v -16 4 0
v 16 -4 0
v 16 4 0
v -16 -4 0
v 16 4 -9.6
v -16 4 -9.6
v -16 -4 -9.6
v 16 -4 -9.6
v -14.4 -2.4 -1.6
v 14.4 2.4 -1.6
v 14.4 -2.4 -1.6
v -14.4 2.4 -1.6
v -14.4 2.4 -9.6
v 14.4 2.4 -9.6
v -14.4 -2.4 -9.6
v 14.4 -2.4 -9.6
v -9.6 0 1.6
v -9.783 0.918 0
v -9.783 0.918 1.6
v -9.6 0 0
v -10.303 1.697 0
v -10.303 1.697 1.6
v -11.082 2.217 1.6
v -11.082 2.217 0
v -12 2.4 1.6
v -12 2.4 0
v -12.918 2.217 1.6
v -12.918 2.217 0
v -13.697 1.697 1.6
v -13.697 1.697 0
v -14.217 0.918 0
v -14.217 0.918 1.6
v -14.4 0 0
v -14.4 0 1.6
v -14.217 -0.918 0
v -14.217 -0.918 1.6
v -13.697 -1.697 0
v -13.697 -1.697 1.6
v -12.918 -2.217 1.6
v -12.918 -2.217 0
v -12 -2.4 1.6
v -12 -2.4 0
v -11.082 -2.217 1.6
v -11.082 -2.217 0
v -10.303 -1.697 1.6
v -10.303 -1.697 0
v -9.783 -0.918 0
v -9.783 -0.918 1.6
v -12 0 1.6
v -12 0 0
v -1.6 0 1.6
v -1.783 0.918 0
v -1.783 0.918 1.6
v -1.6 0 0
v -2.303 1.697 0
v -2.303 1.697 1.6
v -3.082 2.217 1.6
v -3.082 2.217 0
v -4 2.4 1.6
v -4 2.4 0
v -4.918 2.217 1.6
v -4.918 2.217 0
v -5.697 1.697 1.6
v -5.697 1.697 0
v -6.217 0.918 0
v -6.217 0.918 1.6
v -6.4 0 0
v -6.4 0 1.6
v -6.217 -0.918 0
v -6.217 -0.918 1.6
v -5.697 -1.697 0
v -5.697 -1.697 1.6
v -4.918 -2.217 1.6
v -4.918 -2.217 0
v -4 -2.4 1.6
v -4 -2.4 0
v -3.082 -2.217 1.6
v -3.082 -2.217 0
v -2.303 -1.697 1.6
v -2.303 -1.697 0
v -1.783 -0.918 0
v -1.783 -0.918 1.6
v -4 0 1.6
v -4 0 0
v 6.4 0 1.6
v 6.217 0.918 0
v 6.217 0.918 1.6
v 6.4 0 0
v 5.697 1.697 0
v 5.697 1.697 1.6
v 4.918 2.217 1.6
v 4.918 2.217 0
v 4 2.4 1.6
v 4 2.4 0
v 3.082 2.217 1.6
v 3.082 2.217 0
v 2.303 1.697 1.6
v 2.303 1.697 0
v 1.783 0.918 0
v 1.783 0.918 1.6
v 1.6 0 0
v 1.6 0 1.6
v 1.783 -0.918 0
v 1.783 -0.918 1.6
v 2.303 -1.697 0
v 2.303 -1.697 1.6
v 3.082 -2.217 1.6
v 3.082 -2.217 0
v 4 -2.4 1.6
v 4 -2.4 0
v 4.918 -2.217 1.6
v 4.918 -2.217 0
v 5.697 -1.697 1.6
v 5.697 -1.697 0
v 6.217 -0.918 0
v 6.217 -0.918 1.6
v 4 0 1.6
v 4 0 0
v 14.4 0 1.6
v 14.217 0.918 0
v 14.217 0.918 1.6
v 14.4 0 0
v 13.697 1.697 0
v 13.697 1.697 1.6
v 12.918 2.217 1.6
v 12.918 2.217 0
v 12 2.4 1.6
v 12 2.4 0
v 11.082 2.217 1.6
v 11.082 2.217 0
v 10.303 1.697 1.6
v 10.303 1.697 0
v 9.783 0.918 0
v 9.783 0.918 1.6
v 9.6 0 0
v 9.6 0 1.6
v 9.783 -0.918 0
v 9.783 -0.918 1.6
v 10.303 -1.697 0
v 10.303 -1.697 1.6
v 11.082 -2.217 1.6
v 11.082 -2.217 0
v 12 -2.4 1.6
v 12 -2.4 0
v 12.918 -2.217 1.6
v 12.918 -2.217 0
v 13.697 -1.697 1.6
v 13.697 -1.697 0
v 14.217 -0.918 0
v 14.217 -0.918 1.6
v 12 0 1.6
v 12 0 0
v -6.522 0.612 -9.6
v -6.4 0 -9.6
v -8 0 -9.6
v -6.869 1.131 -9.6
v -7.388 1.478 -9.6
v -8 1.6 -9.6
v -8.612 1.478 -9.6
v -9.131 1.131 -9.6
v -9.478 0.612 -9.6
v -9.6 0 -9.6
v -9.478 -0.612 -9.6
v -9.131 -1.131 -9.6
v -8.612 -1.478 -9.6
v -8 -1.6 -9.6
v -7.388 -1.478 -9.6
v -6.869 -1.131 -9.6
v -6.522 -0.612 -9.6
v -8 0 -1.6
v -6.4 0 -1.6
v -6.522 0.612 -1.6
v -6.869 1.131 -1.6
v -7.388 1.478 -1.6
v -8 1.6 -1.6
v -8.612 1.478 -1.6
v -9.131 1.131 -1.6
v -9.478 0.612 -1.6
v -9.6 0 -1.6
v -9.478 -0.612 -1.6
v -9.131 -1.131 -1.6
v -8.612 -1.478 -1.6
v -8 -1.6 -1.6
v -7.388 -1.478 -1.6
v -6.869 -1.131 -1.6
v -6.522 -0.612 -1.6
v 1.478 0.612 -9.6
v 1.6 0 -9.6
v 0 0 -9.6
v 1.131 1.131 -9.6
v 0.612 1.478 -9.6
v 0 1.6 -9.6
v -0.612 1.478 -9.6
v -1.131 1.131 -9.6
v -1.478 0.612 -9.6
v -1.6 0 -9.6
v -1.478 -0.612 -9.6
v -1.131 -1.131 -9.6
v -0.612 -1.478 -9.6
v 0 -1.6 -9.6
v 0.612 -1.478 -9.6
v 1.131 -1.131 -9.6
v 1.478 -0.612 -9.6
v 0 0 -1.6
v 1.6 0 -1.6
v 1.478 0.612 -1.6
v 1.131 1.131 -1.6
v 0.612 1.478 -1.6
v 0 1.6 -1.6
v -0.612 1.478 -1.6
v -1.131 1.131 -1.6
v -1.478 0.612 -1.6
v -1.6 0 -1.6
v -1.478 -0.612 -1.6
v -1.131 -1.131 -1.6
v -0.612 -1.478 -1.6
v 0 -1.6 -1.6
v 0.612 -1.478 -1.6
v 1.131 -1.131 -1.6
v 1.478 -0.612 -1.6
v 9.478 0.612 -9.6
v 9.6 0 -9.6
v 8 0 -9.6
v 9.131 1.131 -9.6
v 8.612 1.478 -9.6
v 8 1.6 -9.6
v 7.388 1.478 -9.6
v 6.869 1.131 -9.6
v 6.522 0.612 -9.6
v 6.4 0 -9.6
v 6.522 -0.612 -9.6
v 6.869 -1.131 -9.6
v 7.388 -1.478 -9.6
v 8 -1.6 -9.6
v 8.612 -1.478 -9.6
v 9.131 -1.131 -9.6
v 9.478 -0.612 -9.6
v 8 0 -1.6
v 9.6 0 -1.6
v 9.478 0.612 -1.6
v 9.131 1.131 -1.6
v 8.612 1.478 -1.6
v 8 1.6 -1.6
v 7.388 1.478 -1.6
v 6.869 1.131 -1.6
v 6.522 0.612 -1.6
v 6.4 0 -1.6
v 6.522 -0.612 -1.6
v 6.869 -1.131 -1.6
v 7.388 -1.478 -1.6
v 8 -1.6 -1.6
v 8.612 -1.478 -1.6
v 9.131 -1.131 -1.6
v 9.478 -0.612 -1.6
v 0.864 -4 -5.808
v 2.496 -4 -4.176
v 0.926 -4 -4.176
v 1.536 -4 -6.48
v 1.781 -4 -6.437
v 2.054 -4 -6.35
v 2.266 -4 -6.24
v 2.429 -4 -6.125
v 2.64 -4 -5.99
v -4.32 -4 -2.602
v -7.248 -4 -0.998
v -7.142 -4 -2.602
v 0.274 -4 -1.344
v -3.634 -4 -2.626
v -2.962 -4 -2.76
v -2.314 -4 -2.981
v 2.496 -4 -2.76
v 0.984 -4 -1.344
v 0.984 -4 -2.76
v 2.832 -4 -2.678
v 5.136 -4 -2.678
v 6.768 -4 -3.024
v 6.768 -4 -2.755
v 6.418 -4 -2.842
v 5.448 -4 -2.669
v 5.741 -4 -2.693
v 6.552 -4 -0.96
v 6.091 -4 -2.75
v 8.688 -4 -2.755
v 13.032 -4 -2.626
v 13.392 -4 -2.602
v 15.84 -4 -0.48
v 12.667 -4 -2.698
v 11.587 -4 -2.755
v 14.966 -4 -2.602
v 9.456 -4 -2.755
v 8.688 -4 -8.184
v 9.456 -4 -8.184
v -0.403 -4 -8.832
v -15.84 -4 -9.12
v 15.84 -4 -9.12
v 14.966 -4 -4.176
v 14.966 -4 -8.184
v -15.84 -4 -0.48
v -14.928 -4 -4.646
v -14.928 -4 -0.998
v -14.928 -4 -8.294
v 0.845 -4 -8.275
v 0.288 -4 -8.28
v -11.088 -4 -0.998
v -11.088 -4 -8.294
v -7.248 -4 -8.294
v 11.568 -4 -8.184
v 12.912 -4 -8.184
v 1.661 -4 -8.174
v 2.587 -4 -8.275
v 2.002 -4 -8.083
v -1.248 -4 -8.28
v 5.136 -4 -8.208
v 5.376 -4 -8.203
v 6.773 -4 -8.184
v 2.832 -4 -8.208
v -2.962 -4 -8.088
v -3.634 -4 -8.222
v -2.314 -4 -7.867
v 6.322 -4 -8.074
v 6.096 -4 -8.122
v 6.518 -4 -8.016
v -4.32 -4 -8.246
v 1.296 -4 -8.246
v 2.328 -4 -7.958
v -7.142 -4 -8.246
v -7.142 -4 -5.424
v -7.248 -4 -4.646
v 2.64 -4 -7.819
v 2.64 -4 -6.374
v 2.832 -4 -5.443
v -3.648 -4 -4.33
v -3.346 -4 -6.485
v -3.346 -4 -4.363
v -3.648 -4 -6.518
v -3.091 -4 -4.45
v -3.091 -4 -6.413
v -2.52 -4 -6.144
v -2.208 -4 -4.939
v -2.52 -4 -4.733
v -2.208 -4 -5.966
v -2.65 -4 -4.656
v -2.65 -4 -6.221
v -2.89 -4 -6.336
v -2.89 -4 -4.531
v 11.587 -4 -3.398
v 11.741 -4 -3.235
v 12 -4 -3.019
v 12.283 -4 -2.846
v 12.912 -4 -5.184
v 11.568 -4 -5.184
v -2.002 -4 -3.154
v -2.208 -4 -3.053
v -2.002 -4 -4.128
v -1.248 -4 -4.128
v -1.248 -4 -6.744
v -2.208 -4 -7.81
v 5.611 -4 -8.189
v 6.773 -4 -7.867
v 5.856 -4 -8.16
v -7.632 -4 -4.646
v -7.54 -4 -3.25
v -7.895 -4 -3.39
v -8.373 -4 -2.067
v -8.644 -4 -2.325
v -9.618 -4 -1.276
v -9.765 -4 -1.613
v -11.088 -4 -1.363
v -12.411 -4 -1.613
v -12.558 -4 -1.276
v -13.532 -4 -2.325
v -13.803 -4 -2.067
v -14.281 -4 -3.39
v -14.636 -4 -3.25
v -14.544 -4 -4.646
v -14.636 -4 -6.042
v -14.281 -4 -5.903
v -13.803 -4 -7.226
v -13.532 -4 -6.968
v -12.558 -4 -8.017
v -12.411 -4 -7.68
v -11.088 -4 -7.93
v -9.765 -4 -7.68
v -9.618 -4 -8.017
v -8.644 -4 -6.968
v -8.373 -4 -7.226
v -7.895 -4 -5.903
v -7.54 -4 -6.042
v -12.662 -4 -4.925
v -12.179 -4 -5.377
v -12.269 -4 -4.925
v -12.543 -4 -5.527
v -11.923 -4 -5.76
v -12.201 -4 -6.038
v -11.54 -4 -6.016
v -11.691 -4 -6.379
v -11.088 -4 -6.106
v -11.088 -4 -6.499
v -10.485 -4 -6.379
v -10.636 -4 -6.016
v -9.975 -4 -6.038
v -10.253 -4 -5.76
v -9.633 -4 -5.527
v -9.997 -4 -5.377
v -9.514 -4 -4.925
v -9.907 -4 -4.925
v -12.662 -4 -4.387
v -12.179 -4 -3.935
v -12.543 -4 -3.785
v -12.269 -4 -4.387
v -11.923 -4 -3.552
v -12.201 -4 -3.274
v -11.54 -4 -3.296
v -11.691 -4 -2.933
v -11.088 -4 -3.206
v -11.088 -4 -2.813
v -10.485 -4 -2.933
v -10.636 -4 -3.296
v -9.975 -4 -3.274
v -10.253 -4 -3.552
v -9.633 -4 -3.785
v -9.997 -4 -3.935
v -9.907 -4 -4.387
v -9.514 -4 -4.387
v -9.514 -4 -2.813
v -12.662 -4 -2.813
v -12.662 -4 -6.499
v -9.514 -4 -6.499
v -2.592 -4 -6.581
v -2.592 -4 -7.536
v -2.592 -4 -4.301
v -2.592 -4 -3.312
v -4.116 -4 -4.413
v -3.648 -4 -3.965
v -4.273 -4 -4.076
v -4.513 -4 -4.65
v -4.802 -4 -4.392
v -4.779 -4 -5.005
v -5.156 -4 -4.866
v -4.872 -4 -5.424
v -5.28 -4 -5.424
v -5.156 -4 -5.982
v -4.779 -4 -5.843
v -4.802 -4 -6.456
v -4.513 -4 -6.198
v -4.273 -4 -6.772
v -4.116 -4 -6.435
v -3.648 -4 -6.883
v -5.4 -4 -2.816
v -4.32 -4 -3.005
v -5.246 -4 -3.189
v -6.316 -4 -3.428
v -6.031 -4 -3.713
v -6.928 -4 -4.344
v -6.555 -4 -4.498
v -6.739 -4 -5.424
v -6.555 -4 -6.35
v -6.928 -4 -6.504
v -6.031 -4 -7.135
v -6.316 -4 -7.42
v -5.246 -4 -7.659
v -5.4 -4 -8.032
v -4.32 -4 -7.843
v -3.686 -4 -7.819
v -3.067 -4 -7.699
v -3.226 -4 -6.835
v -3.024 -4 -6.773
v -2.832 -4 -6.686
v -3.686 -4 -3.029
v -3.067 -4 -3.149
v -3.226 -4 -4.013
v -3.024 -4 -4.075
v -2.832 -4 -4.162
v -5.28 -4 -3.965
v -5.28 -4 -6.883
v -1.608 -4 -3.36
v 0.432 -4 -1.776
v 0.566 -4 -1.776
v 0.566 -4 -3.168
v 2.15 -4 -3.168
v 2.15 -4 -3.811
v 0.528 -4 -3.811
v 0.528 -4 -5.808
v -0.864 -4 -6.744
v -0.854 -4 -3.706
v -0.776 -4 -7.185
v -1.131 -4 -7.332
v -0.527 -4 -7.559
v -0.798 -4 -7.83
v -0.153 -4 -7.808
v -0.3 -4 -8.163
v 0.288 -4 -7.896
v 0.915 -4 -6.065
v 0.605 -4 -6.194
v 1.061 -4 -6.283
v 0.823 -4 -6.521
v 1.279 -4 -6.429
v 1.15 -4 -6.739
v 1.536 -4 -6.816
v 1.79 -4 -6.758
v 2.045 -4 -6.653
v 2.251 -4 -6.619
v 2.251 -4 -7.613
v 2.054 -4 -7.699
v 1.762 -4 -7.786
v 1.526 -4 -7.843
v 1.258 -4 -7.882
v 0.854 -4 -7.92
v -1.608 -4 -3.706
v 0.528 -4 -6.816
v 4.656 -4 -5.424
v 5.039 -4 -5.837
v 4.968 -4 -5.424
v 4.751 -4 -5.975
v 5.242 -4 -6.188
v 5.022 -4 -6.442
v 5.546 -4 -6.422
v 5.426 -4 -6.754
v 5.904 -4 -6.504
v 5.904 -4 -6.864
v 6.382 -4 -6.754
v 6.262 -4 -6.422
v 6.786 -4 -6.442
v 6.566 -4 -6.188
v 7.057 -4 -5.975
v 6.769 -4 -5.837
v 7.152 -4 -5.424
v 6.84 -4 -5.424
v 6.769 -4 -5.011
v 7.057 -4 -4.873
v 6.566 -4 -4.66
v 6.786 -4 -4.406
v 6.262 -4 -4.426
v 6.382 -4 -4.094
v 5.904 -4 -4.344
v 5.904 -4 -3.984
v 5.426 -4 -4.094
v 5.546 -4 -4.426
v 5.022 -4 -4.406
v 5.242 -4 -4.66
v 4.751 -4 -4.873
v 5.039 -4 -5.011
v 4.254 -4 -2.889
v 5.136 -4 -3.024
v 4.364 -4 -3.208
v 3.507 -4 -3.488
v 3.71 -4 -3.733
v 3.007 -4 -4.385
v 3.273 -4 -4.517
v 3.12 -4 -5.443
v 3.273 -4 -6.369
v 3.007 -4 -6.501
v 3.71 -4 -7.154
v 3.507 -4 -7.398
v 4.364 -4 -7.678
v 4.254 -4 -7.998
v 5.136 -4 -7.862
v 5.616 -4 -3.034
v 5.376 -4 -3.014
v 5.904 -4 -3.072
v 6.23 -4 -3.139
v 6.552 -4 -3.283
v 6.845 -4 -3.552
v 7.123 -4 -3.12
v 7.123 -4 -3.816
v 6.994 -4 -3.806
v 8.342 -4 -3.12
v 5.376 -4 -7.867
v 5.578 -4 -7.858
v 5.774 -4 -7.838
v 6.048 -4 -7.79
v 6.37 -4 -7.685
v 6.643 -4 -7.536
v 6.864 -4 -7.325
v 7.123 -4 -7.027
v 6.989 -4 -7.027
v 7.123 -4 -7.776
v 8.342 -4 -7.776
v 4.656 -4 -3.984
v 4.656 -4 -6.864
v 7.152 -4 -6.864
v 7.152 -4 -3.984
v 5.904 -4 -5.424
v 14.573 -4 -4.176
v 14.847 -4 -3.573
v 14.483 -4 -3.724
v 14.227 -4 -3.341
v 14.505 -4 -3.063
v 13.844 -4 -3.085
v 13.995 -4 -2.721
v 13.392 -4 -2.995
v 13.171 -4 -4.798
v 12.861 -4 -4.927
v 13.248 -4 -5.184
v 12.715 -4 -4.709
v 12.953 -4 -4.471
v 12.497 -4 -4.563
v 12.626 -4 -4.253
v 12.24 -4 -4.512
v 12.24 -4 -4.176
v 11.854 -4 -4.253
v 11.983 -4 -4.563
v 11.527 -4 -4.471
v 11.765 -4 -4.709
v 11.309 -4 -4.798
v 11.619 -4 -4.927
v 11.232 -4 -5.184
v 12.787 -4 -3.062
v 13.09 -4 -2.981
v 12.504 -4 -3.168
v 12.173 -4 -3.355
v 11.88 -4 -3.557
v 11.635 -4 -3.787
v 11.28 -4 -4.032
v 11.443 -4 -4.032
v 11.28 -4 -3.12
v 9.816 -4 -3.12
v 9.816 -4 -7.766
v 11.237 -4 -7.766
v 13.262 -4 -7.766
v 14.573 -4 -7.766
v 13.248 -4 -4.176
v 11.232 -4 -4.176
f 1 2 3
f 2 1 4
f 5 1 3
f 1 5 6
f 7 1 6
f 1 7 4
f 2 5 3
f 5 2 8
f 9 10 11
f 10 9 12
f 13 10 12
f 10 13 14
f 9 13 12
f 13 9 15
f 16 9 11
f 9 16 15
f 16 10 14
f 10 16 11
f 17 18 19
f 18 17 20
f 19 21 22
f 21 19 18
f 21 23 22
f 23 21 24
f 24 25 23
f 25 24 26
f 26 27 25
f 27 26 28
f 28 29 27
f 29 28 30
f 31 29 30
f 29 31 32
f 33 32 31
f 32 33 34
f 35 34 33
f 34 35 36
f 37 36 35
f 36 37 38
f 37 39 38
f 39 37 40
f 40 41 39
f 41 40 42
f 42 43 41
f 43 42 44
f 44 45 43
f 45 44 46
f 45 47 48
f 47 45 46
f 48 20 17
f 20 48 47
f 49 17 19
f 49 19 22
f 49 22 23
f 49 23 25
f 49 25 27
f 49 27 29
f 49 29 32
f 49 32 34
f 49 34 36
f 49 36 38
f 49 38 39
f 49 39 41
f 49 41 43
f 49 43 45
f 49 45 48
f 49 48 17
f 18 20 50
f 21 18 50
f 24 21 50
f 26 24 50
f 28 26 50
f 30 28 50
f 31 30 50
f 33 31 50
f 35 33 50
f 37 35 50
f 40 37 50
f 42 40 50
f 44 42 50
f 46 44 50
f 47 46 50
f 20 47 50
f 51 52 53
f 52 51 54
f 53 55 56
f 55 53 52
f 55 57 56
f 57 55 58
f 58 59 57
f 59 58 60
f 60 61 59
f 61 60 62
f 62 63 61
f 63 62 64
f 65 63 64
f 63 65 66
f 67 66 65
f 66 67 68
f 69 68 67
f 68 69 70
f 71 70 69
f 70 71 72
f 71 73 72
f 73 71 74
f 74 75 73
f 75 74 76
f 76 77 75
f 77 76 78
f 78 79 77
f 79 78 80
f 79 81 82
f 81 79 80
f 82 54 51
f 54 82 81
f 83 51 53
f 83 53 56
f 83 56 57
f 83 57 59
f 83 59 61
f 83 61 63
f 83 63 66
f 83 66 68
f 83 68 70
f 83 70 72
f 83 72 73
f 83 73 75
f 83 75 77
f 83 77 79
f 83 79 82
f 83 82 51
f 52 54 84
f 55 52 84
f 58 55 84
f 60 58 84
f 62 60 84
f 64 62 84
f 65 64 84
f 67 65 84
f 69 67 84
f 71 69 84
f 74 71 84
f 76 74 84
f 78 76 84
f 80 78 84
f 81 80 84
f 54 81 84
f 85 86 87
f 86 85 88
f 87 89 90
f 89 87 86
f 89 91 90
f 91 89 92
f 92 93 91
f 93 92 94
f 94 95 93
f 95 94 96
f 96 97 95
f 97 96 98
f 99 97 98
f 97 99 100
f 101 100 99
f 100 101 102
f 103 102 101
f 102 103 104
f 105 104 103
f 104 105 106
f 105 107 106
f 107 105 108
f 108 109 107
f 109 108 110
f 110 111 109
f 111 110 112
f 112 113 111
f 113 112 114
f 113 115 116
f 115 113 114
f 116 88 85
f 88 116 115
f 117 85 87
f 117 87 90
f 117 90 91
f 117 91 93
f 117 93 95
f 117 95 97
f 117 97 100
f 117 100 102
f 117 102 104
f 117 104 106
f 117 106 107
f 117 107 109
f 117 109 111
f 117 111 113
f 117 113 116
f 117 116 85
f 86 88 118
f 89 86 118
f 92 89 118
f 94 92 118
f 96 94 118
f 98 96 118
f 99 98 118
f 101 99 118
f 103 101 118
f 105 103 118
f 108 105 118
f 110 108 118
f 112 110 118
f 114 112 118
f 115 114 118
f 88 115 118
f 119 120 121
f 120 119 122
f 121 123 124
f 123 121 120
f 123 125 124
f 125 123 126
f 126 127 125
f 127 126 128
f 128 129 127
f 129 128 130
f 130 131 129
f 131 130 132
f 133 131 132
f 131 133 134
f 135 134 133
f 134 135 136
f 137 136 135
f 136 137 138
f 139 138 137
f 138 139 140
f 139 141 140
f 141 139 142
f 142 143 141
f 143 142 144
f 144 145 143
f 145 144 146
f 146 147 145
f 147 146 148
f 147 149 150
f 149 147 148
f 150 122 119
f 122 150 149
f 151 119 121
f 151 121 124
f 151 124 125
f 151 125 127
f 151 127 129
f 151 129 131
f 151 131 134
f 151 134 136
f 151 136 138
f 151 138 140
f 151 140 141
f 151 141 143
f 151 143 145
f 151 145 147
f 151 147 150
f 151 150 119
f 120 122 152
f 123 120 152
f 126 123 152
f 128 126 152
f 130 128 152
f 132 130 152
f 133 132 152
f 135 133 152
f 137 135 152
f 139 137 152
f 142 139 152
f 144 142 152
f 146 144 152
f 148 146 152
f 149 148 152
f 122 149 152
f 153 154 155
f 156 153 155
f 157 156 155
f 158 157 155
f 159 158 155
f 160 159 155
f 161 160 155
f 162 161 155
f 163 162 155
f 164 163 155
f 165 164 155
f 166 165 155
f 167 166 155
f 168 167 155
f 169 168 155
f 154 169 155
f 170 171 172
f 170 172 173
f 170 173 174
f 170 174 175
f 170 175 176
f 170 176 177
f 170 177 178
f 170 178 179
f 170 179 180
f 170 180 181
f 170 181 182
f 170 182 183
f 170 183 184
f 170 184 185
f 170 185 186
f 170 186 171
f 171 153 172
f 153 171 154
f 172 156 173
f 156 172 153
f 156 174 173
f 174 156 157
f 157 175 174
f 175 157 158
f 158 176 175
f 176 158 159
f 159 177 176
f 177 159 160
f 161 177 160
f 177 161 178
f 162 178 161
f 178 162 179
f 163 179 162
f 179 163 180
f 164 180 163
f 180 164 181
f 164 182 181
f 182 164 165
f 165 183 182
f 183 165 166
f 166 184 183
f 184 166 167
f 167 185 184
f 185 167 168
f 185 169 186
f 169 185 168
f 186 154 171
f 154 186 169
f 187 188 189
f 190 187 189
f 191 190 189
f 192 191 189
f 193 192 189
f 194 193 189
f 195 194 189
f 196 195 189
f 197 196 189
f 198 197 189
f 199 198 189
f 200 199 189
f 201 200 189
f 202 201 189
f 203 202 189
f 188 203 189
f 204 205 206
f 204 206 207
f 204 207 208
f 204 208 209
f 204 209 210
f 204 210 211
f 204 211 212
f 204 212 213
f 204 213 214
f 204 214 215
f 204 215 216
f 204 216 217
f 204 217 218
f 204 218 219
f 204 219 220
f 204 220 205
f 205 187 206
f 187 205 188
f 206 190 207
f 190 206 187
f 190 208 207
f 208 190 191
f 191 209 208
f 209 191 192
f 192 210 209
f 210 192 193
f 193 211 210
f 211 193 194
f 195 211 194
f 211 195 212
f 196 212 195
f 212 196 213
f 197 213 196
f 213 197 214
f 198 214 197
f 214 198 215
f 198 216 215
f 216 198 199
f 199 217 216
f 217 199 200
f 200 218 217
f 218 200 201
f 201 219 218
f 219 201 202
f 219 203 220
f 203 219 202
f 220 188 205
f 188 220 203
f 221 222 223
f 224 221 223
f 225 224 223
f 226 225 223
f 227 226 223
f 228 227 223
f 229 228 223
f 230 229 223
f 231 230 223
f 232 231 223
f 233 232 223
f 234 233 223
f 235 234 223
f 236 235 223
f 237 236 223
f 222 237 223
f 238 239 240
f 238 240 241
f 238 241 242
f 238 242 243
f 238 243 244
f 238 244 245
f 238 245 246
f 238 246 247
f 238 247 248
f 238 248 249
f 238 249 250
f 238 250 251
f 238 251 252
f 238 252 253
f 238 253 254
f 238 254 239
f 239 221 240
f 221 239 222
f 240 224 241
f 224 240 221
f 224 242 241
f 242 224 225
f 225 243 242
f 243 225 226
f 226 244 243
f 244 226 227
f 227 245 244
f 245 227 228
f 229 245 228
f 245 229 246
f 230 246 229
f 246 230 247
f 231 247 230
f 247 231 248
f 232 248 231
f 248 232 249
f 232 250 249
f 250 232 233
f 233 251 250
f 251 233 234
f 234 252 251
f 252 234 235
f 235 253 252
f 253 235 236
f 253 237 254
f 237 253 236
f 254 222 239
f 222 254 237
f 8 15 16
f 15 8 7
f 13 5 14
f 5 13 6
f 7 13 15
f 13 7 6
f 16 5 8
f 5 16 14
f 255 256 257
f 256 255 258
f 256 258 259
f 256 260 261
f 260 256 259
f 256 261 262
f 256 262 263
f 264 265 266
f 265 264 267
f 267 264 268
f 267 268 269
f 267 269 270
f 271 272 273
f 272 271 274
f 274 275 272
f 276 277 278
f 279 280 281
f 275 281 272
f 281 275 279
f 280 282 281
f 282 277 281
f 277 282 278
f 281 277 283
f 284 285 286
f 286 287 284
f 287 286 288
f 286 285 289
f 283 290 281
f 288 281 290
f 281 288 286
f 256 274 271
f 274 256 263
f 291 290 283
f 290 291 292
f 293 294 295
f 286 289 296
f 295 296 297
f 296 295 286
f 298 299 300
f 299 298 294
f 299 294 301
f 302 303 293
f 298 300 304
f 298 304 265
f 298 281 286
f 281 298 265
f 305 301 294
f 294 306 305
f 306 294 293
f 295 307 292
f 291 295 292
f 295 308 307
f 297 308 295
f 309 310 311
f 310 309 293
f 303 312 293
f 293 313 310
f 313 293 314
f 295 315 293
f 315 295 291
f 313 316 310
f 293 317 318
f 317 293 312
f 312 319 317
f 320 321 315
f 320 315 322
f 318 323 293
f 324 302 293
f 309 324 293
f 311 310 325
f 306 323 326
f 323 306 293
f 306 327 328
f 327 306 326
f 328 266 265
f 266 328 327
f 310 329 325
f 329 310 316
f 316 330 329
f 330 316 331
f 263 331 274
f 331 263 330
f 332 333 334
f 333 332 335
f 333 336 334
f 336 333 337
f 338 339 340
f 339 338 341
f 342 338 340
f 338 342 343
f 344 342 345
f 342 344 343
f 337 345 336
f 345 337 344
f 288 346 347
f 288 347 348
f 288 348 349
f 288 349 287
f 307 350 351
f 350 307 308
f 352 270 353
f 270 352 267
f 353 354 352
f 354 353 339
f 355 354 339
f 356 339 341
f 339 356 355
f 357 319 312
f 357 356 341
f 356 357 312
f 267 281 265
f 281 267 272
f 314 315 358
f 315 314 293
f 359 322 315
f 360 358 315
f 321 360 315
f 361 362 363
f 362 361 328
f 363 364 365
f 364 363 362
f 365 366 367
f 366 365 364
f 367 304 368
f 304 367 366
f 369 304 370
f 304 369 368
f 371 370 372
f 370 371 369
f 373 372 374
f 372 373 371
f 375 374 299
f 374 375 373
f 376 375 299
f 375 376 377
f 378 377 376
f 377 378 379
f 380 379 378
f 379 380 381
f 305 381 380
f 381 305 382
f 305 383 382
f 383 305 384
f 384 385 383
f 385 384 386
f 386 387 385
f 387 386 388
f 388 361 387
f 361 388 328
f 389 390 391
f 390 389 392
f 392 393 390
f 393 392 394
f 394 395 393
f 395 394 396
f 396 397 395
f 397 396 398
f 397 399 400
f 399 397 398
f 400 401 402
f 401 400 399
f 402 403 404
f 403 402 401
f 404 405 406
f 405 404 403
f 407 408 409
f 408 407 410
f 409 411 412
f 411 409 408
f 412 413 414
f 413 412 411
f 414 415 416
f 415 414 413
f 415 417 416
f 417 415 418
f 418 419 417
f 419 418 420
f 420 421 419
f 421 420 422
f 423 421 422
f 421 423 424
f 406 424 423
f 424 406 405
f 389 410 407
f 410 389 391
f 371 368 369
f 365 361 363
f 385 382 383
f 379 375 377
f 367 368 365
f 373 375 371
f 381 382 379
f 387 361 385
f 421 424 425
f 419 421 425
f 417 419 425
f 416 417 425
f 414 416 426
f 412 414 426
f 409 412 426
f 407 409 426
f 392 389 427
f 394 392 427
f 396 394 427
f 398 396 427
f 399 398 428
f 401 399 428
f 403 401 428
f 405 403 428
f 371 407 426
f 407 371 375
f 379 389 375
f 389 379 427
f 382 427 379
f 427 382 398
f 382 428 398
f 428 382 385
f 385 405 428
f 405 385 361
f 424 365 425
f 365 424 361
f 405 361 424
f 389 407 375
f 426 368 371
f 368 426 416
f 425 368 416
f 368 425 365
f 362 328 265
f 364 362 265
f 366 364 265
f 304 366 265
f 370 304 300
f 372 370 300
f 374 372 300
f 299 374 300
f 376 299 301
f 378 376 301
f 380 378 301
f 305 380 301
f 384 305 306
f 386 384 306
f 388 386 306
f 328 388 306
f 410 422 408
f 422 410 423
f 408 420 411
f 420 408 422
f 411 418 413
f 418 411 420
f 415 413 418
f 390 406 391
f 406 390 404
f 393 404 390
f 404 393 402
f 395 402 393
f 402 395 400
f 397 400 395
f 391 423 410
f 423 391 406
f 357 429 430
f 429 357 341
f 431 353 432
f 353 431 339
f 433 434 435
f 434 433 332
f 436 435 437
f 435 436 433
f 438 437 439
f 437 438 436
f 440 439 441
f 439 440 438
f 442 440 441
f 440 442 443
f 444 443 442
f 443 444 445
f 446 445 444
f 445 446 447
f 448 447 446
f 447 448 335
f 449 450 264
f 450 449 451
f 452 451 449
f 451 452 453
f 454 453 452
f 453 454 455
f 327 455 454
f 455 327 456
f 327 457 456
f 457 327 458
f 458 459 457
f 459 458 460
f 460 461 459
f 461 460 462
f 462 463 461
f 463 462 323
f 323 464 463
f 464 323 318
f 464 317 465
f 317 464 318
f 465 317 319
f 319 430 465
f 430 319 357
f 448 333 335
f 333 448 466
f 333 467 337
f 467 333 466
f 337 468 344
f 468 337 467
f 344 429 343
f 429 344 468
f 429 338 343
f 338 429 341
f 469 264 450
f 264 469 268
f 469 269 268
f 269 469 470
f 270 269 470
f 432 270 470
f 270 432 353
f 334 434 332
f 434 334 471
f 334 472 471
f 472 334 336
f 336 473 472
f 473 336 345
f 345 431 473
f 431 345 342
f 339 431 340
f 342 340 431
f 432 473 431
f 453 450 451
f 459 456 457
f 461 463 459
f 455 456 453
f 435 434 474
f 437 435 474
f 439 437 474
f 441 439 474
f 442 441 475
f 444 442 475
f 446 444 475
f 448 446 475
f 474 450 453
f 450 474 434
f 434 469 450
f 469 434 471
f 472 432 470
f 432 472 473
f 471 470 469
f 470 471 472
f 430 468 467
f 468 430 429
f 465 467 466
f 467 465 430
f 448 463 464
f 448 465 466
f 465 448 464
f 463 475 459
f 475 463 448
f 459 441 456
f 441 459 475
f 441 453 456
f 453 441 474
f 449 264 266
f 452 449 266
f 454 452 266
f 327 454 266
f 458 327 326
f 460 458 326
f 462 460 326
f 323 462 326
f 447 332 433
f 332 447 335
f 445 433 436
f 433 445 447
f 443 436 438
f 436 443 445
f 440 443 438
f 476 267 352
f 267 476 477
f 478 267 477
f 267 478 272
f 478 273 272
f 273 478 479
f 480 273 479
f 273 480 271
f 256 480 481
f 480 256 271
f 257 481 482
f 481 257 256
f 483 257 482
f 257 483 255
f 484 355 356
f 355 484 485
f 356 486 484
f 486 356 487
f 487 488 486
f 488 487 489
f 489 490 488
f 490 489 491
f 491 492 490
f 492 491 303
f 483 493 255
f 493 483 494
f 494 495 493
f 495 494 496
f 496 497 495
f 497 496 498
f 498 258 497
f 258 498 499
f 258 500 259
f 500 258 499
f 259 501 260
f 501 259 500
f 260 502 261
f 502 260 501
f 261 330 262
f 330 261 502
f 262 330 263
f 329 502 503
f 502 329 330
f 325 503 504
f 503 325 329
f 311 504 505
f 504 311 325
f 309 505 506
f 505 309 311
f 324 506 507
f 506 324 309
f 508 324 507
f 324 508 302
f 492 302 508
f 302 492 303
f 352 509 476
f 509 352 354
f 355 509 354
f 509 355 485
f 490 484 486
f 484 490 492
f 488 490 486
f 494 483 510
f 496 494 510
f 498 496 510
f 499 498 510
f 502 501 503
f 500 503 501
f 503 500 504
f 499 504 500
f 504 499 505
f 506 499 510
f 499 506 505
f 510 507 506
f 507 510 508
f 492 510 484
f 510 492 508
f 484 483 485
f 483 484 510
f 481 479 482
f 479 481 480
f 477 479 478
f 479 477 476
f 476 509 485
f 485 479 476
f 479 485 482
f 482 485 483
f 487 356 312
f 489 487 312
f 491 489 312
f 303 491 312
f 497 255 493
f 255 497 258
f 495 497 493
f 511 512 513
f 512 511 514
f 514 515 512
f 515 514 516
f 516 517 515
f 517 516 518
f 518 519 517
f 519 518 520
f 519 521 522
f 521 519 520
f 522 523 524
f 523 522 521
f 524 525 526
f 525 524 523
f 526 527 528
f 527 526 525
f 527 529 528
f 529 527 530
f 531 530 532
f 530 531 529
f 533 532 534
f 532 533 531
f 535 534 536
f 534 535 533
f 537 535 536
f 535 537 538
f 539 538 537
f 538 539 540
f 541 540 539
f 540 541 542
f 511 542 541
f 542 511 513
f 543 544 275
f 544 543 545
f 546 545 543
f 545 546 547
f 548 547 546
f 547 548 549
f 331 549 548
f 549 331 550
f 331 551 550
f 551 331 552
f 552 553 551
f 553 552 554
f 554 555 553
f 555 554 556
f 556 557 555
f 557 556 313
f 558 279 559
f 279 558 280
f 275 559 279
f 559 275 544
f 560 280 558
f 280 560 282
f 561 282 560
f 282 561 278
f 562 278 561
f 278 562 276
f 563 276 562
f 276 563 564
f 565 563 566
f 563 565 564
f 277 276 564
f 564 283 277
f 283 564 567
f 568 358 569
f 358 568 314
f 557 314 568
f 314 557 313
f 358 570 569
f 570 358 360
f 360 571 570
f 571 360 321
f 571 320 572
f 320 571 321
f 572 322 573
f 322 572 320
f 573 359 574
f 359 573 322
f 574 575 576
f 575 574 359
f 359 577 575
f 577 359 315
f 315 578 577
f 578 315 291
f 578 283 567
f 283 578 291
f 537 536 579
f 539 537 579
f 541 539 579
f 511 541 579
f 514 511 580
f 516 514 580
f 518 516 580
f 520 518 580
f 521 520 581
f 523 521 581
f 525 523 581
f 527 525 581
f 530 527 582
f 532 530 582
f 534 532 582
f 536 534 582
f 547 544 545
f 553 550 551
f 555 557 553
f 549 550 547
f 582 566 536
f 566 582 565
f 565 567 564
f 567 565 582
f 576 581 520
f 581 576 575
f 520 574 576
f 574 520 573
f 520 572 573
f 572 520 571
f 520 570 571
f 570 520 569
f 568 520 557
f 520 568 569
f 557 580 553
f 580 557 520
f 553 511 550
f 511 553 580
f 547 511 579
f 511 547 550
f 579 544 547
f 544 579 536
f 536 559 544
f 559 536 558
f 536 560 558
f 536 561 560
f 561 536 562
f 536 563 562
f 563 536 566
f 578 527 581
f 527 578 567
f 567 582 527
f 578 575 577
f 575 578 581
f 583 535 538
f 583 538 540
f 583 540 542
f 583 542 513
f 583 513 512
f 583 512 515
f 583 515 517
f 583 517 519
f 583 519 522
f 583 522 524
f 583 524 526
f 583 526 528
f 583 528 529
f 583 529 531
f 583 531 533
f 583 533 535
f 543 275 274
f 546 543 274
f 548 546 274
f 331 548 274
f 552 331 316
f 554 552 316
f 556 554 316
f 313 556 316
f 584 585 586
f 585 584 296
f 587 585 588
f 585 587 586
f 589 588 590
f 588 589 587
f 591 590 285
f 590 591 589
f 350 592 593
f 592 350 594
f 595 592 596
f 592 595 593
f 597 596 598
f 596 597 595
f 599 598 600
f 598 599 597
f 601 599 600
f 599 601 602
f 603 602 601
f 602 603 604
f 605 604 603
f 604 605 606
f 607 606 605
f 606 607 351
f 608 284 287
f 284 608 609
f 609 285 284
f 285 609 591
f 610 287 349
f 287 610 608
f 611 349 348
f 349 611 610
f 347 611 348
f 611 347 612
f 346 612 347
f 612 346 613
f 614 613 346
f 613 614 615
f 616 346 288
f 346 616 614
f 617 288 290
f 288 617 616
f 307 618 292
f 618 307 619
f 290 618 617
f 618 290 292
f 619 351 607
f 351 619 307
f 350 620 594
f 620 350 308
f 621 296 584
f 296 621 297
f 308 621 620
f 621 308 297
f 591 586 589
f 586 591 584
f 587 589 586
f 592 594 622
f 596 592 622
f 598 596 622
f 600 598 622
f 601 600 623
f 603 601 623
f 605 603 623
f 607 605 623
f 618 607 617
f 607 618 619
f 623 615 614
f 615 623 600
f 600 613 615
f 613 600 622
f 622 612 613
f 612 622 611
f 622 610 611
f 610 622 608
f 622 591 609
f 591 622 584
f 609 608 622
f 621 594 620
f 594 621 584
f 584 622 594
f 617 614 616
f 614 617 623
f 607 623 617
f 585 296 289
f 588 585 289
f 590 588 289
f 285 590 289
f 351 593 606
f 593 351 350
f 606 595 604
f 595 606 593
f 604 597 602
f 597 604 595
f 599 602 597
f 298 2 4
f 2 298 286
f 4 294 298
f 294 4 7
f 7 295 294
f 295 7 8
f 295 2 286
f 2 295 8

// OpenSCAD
use <../lib.scad>
use <../p/logo-octantext.scad>
use <s/3010s01.scad>
function ldraw_lib__3010p75() = [
// 0 Brick  1 x  4 with Octan Pattern
// 0 Name: 3010p75.dat
// 0 Author: Tim Lampmann [L4mpi]
// 0 !LDRAW_ORG Part UPDATE 2022-01
// 0 !LICENSE Licensed under CC BY 4.0 : see CAreadme.txt
// 
// 0 BFC CERTIFY CCW
  [0,"BFC","CERTIFY"],
  [0,"BFC","CCW"],
// 
// 0 !KEYWORDS BrickLink 3010pb021, set 4609, Set 6548, set 9305
// 
// 0 !HISTORY 2022-01-14 [PTadmin] Official Update 2022-01
// 
// 
// 1 16 0 0 0 1 0 0 0 1 0 0 0 1 s\3010s01.dat
  [1,16,0,0,0,1,0,0,0,1,0,0,0,1, ldraw_lib__s__3010s01()],
// 1 16 0 12 -10 1.2 0 0 0 0 -1.2 0 1 0 logo-octantext.dat
  [1,16,0,12,-10,1.2,0,0,0,0,-1.2,0,1,0, ldraw_lib__logo_octantext()],
// 4 16 -40 0 -10 -39.6 1.2 -10 39.6 1.2 -10 40 0 -10
  [4,16,-40,0,-10,-39.6,1.2,-10,39.6,1.2,-10,40,0,-10],
// 4 16 -40 0 -10 -40 24 -10 -39.6 22.8 -10 -39.6 1.2 -10
  [4,16,-40,0,-10,-40,24,-10,-39.6,22.8,-10,-39.6,1.2,-10],
// 4 16 -39.6 22.8 -10 -40 24 -10 40 24 -10 39.6 22.8 -10
  [4,16,-39.6,22.8,-10,-40,24,-10,40,24,-10,39.6,22.8,-10],
// 4 16 39.6 1.2 -10 39.6 22.8 -10 40 24 -10 40 0 -10
  [4,16,39.6,1.2,-10,39.6,22.8,-10,40,24,-10,40,0,-10],
];
module ldraw_lib__3010p75(step=0, col=false, unit=2/5, alt=false, line=0.2, solid=!$preview)
    makepoly(ldraw_lib__3010p75(), step=step, col=col, unit=unit, alt=alt, line=line, solid=solid);
ldraw_lib__3010p75(line=0.2);
